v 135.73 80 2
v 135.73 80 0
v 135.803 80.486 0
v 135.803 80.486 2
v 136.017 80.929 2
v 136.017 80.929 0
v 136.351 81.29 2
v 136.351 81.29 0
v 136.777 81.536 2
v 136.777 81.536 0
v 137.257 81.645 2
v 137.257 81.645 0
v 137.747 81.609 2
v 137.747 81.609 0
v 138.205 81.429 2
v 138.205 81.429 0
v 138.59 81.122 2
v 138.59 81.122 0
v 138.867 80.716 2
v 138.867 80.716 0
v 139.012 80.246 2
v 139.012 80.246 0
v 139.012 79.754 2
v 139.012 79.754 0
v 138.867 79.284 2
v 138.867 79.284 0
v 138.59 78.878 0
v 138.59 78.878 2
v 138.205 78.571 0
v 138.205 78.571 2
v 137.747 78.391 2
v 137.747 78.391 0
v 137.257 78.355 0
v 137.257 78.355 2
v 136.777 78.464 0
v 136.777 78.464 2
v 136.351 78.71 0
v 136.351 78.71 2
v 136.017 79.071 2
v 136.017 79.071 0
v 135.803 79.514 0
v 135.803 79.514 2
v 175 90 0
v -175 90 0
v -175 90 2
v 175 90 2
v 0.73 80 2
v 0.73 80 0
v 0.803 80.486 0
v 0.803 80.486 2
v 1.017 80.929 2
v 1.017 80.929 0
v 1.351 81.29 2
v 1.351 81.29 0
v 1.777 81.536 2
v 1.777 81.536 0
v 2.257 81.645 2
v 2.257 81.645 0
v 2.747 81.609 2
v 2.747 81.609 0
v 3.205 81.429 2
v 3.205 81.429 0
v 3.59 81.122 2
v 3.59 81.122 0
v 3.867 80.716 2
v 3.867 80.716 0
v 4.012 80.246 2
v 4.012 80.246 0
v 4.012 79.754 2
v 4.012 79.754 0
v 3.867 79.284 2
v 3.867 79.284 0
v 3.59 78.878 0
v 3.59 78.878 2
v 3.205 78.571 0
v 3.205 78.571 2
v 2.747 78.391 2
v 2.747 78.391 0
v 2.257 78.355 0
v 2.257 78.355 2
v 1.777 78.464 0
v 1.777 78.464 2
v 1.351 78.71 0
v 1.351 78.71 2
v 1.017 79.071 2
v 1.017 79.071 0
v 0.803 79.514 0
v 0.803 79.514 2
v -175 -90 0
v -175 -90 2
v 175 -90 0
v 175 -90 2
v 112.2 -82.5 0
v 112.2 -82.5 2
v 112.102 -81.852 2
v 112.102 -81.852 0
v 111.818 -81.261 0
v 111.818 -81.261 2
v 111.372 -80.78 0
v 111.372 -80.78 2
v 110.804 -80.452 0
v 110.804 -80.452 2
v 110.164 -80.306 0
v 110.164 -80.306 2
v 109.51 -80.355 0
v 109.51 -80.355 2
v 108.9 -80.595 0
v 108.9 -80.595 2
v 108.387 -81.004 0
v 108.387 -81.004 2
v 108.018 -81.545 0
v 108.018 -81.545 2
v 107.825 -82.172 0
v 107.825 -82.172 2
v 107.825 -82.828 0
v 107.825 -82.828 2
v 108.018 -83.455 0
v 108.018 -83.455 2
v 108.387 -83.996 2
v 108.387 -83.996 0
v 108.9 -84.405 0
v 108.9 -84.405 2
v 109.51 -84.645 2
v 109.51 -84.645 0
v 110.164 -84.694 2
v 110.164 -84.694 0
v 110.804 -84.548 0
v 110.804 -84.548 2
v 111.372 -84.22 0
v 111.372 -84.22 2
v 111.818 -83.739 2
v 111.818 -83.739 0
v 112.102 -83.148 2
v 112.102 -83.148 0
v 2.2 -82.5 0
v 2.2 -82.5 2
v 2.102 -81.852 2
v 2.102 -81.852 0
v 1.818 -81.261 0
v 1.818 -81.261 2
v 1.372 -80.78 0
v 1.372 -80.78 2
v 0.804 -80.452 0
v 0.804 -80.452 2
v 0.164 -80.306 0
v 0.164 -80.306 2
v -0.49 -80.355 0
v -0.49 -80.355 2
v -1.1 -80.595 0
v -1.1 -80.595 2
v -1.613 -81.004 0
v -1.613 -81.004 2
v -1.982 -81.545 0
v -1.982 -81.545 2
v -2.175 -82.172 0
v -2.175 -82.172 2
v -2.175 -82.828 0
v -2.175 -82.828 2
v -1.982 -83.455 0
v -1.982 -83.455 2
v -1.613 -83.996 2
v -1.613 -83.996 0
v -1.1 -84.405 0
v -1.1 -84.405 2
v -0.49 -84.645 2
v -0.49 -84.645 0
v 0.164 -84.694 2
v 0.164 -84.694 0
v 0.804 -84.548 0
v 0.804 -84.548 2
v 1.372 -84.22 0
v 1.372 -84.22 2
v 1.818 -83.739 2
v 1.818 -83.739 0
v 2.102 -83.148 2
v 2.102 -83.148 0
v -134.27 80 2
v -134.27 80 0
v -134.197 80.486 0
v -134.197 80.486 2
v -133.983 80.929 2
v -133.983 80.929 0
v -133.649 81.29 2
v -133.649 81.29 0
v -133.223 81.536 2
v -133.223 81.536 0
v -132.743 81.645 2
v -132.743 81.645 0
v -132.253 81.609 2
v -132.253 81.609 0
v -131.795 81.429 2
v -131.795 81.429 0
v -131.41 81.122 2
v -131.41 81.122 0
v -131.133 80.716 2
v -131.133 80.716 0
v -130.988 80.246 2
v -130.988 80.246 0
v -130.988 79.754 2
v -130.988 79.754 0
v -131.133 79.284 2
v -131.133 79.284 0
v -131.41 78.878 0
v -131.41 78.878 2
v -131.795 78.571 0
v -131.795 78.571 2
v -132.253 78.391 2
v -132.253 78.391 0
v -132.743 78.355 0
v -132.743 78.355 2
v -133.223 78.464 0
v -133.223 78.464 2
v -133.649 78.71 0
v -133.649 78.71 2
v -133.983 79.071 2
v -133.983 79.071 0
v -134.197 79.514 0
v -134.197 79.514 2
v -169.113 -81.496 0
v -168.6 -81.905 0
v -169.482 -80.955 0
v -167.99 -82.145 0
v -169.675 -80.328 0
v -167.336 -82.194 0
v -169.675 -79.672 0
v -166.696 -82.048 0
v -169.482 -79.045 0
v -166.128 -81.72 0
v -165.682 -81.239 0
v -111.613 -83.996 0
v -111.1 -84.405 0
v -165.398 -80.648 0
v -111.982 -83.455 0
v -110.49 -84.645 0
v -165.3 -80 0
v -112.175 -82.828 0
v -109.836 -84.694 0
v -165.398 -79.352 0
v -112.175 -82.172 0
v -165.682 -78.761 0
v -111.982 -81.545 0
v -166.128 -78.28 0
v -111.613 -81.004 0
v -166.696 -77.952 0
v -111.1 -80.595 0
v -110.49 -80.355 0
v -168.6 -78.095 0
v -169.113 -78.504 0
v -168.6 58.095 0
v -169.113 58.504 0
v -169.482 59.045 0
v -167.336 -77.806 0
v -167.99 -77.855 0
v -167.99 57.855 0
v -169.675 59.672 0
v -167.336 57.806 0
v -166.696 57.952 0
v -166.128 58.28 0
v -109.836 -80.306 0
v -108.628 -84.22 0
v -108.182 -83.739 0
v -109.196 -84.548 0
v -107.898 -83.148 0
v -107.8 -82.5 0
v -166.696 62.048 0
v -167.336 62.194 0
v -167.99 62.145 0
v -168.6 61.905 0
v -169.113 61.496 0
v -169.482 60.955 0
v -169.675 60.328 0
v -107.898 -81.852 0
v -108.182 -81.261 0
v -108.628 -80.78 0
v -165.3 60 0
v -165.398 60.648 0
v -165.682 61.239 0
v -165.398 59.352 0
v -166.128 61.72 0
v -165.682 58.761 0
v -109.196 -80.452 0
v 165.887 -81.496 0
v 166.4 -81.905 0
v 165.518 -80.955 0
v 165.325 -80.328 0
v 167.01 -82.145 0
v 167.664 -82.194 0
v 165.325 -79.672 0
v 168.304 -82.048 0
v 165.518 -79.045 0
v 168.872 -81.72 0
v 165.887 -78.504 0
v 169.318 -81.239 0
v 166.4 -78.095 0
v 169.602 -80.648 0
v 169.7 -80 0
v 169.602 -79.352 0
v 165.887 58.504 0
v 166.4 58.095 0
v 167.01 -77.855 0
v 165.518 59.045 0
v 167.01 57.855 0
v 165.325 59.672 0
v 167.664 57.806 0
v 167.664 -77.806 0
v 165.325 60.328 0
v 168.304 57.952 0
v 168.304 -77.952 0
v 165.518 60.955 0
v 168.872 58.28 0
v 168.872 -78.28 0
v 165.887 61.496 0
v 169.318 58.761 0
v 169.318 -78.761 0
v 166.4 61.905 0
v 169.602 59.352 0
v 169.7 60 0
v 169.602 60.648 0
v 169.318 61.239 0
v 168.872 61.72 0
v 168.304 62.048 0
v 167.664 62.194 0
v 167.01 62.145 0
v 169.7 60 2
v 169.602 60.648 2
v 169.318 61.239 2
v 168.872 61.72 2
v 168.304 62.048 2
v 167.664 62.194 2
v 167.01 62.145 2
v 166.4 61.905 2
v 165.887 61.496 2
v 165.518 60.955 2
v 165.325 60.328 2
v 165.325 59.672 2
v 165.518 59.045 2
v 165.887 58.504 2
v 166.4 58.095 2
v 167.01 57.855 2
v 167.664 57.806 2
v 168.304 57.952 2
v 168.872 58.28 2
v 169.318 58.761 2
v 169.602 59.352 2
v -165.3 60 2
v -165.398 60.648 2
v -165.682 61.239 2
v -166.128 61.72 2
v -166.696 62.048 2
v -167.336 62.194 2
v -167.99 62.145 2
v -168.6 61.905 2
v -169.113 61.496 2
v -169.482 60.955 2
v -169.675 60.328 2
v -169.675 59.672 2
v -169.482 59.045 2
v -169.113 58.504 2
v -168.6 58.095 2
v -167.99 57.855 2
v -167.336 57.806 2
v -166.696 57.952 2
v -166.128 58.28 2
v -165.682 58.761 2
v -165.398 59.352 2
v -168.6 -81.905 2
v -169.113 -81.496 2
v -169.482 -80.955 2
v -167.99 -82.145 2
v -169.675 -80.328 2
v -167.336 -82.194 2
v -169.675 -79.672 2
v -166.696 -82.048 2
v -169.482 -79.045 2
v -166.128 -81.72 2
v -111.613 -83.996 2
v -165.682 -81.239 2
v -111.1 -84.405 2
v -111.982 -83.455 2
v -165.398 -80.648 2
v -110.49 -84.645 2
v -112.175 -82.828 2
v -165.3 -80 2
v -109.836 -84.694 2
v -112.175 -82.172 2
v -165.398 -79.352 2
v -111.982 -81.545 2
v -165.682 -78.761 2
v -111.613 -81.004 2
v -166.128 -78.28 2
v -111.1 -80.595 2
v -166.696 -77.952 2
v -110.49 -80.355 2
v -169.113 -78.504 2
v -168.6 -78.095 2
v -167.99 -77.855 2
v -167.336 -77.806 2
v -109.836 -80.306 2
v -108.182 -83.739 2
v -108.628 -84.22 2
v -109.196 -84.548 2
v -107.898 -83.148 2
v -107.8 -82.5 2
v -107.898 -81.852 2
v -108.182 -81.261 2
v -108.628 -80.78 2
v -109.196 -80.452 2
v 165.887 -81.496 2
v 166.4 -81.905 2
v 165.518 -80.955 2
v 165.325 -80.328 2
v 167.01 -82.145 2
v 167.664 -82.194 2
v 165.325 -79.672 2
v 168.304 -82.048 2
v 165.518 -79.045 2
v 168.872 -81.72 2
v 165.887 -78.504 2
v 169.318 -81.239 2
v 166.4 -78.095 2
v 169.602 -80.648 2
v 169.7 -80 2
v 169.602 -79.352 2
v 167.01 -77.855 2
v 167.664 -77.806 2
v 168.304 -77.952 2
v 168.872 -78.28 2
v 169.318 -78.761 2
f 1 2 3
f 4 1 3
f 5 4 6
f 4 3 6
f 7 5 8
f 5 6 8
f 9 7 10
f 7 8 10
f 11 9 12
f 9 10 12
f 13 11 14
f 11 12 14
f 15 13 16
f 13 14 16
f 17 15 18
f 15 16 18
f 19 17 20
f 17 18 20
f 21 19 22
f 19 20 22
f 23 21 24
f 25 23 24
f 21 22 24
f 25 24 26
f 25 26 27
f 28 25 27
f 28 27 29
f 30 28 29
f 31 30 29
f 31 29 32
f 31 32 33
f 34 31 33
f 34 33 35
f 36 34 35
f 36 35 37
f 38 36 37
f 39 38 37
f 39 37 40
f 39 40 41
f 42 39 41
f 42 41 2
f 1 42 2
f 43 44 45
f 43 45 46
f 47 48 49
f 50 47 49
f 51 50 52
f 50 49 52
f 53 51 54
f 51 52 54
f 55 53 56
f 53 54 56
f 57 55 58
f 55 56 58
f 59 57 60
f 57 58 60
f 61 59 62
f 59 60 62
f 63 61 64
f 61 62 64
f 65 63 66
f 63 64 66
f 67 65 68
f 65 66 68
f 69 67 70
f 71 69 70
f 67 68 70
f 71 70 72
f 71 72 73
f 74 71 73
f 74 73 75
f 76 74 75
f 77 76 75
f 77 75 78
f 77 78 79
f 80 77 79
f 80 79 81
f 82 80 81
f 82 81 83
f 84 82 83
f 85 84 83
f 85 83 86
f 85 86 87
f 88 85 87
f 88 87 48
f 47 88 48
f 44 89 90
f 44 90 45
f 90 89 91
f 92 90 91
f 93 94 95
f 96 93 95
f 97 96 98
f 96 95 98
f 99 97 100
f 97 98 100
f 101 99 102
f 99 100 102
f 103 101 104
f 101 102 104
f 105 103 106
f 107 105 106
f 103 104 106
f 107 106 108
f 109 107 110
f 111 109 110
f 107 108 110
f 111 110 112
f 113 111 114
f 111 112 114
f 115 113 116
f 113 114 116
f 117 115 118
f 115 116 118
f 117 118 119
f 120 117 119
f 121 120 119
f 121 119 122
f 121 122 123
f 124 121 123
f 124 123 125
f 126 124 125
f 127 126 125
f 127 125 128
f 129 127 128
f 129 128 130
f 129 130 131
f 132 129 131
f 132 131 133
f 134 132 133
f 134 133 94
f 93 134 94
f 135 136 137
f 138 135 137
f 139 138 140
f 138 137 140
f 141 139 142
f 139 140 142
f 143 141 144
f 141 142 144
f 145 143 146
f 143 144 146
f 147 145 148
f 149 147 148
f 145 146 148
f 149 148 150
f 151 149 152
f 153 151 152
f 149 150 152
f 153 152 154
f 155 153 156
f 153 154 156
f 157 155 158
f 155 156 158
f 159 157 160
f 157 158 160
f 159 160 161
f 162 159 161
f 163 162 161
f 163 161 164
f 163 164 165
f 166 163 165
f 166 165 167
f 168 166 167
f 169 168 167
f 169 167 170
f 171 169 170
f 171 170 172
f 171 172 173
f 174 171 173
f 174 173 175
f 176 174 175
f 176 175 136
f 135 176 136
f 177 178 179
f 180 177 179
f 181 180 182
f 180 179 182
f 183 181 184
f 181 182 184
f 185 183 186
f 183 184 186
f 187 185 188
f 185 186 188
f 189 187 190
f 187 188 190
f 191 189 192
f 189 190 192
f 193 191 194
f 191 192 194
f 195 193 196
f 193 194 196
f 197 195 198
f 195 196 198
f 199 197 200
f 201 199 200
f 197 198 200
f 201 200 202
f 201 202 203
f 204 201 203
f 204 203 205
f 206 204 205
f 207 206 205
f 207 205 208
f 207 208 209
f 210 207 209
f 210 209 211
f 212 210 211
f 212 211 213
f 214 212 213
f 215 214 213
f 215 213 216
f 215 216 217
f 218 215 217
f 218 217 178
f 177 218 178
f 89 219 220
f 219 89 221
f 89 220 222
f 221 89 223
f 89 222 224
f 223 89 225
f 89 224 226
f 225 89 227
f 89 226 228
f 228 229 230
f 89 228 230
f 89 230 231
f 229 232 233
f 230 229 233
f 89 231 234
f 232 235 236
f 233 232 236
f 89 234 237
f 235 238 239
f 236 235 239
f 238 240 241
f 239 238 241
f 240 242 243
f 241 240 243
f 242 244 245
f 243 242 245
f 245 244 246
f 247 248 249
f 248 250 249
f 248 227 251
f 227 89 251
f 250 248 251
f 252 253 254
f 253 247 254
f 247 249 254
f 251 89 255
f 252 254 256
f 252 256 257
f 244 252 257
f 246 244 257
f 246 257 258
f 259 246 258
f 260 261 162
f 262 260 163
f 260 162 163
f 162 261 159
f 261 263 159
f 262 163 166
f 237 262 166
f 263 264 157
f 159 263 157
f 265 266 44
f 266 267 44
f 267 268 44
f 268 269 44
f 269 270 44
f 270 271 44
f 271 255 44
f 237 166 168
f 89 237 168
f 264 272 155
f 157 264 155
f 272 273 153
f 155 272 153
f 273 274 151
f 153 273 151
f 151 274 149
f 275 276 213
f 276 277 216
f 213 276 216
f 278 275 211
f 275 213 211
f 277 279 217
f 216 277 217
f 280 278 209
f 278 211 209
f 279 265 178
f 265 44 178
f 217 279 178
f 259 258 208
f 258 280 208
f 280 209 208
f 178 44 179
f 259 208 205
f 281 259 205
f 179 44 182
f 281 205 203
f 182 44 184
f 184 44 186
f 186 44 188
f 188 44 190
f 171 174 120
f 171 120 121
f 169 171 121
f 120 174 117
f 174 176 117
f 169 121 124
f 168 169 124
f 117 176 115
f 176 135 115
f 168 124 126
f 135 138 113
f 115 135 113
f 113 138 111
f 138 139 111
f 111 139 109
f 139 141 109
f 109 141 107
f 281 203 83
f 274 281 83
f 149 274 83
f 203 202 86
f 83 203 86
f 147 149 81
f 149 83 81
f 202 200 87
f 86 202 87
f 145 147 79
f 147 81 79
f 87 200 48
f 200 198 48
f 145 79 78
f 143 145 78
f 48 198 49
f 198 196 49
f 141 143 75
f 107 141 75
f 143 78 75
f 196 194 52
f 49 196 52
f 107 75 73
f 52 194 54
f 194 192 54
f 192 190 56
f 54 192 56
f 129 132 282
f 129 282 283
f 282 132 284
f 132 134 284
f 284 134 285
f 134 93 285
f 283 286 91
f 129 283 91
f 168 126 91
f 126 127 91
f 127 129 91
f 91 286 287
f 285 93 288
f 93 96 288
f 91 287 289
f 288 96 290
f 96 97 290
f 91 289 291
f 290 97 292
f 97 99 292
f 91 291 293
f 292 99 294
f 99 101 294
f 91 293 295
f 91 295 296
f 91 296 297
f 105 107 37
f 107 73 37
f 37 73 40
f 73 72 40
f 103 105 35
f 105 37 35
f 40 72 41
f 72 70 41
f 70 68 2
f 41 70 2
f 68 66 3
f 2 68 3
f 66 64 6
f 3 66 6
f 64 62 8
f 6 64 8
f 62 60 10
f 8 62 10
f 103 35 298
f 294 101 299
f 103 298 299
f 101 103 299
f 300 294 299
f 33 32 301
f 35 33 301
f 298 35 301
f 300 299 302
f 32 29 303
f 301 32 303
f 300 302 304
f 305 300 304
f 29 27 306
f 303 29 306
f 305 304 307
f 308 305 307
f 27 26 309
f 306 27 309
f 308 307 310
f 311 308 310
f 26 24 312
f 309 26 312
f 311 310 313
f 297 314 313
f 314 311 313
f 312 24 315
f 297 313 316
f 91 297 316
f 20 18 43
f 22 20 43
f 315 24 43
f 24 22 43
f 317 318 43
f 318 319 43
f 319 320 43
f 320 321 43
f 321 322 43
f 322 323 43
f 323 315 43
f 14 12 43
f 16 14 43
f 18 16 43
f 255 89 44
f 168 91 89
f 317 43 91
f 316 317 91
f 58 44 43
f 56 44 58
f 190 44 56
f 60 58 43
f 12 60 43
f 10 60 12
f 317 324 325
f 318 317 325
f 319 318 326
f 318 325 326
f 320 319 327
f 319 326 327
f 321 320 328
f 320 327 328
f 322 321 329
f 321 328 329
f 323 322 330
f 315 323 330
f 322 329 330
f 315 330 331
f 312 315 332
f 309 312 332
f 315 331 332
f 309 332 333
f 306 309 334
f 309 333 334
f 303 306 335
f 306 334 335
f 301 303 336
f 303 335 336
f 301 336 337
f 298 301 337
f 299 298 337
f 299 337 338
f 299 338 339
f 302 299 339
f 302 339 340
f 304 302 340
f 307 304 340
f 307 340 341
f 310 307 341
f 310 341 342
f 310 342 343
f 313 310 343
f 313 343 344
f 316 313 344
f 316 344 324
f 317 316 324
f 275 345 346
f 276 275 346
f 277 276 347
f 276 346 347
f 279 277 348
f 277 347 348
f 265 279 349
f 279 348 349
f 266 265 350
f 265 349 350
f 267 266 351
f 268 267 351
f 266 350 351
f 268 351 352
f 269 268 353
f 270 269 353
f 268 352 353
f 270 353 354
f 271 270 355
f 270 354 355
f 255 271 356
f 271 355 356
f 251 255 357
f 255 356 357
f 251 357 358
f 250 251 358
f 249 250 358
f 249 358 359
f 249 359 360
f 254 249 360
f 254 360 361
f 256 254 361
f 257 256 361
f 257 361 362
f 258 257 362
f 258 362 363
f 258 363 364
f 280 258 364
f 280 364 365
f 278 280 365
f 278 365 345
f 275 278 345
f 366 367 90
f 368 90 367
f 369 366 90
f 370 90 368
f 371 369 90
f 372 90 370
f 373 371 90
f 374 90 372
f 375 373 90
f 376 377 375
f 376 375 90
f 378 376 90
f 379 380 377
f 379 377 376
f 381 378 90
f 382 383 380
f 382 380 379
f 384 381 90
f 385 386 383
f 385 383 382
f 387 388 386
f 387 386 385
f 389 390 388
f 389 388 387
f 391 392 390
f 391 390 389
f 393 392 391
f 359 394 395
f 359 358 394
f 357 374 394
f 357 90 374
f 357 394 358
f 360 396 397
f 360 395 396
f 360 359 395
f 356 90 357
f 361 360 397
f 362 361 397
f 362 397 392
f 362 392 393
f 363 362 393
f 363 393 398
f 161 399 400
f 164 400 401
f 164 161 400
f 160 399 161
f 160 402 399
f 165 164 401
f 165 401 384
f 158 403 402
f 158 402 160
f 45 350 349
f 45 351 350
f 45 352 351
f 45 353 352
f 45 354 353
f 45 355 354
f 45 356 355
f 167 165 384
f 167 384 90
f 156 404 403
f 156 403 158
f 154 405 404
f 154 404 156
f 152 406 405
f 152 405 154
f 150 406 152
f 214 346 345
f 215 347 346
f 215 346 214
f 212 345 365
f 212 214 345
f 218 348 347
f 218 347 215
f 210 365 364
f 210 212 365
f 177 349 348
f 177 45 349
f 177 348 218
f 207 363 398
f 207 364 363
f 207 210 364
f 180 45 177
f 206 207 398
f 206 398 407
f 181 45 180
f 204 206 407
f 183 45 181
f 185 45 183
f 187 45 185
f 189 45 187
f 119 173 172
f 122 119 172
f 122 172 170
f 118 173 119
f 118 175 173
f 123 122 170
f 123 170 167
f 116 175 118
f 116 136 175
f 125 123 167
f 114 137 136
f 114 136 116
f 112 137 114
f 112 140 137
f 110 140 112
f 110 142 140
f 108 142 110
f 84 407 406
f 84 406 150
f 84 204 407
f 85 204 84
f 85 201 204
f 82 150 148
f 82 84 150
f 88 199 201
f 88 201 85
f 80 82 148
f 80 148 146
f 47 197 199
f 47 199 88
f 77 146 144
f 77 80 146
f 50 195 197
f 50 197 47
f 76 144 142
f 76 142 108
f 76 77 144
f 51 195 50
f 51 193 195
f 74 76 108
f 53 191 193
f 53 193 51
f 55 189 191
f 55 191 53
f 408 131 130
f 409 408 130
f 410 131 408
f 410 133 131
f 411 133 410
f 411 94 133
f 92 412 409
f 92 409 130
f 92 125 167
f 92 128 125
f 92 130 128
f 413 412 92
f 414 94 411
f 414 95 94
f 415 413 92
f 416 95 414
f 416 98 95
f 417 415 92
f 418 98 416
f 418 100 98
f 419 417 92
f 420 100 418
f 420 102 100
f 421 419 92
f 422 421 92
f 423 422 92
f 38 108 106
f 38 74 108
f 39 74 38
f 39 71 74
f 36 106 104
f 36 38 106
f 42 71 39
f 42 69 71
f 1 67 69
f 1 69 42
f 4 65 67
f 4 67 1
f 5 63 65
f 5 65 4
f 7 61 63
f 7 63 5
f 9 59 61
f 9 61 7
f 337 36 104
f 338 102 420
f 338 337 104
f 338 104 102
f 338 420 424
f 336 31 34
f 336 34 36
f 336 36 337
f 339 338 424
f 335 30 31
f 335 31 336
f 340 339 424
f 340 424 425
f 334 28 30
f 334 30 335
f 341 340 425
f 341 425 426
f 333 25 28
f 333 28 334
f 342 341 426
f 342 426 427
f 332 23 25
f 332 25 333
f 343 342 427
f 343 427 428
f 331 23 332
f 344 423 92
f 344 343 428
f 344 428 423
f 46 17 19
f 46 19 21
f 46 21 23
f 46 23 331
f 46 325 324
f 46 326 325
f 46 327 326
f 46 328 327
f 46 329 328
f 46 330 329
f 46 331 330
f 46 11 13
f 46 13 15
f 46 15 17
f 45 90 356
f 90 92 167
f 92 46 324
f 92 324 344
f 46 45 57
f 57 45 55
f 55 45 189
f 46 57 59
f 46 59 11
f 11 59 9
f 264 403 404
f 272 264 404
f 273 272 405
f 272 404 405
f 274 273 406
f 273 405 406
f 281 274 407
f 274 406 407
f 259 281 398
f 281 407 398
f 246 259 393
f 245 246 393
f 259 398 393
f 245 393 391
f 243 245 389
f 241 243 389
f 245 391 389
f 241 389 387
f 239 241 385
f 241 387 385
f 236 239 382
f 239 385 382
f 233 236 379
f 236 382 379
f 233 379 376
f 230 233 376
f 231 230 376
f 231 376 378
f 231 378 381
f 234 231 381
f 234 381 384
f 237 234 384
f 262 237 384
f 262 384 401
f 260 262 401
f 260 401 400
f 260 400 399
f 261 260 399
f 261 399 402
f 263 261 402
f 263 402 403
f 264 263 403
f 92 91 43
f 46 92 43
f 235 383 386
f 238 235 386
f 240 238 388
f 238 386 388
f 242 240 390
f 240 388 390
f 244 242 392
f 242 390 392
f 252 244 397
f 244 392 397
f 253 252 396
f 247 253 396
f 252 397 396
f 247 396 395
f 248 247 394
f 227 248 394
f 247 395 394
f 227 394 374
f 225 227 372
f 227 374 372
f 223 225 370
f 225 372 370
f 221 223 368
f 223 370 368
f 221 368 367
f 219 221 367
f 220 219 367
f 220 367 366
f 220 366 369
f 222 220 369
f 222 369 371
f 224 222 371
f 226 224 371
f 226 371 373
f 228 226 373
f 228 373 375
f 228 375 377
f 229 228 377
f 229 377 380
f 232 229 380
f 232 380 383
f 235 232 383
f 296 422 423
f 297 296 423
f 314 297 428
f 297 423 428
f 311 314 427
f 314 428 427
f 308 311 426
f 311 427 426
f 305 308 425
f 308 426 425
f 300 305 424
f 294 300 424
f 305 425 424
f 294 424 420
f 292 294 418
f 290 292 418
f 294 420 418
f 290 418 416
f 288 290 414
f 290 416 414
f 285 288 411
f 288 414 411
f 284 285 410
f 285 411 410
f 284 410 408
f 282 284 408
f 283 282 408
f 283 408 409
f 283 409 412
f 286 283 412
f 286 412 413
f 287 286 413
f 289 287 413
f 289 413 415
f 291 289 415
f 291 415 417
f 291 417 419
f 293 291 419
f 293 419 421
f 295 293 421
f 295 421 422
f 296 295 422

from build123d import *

# Parameters (mm, degrees)
SKETCH_1_W          = 350
SKETCH_1_H          = 180
EXTRUDE_1_DEPTH     = 2
CUT_EXTRUDE_1_DEPTH = 2
SKETCH_3_R          = 2.2
CUT_EXTRUDE_2_DEPTH = 160
SKETCH_4_R          = 2.2
CUT_EXTRUDE_3_DEPTH = 160
SKETCH_5_R          = 1
CUT_EXTRUDE_4_DEPTH = 10
M4X0_7_1_D          = 3.3


with BuildPart() as part:
    # ｽｹｯﾁ1 → ﾎﾞｽ - 押し出し1 (new body)
    with BuildSketch(Plane.XY):
        Rectangle(SKETCH_1_W, SKETCH_1_H)
    extrude(amount=EXTRUDE_1_DEPTH)

    # ｽｹｯﾁ2 → ｶｯﾄ - 押し出し1 (cut)
    with BuildSketch(Plane.XY.offset(2)):
        with BuildLine():
            ThreePointArc((-131.62, 80), (-131.912893219, 80.707106781), (-132.62, 81))
            Line((-132.62, 81), (-132.62, 80))
            Line((-132.62, 80), (-133.62, 80))
            ThreePointArc((-133.62, 80), (-132.62, 79), (-131.62, 80))
        make_face()
        with BuildLine():
            Line((-132.62, 80), (-132.62, 81))
            ThreePointArc((-132.62, 81), (-133.327106781, 80.707106781), (-133.62, 80))
            Line((-133.62, 80), (-132.62, 80))
        make_face()
        with BuildLine():
            ThreePointArc((138.38, 80), (138.087106781, 80.707106781), (137.38, 81))
            Line((137.38, 81), (137.38, 80))
            Line((137.38, 80), (138.38, 80))
        make_face()
        with BuildLine():
            Line((137.38, 80), (137.38, 81))
            ThreePointArc((137.38, 81), (136.672893219, 79.292893219), (138.38, 80))
            Line((138.38, 80), (137.38, 80))
        make_face()
    extrude(amount=-CUT_EXTRUDE_1_DEPTH, mode=Mode.SUBTRACT)

    # ｽｹｯﾁ3 → ｶｯﾄ - 押し出し2 (cut)
    with BuildSketch(Plane.XY.offset(2)):
        with Locations((-167.5, 60)):
            Circle(SKETCH_3_R)
        with Locations((-167.5, -80)):
            Circle(SKETCH_3_R)
        with Locations((167.5, 60)):
            Circle(SKETCH_3_R)
        with Locations((167.5, -80)):
            Circle(SKETCH_3_R)
    extrude(amount=-CUT_EXTRUDE_2_DEPTH, mode=Mode.SUBTRACT)

    # ｽｹｯﾁ4 → ｶｯﾄ - 押し出し3 (cut)
    with BuildSketch(Plane.XY.offset(2)):
        with Locations((-110, -82.5)):
            Circle(SKETCH_4_R)
        with Locations((0, -82.5)):
            Circle(SKETCH_4_R)
        with Locations((110, -82.5)):
            Circle(SKETCH_4_R)
    extrude(amount=-CUT_EXTRUDE_3_DEPTH, mode=Mode.SUBTRACT)

    # ｽｹｯﾁ5 → ｶｯﾄ - 押し出し4 (cut)
    with BuildSketch(Plane.XY.offset(2)):
        with Locations((2.38, 80)):
            Circle(SKETCH_5_R)
    extrude(amount=-CUT_EXTRUDE_4_DEPTH, mode=Mode.SUBTRACT)

    # M4x0.7 ねじ穴1 (through all)
    with Locations(Plane(origin=(-132.62, 80, 2), x_dir=(1, 0, 0), z_dir=(0, 0, 1))):
        with Locations((0, 0), (135, 0), (270, 0)):
            Hole(M4X0_7_1_D / 2)


solid = part.part
